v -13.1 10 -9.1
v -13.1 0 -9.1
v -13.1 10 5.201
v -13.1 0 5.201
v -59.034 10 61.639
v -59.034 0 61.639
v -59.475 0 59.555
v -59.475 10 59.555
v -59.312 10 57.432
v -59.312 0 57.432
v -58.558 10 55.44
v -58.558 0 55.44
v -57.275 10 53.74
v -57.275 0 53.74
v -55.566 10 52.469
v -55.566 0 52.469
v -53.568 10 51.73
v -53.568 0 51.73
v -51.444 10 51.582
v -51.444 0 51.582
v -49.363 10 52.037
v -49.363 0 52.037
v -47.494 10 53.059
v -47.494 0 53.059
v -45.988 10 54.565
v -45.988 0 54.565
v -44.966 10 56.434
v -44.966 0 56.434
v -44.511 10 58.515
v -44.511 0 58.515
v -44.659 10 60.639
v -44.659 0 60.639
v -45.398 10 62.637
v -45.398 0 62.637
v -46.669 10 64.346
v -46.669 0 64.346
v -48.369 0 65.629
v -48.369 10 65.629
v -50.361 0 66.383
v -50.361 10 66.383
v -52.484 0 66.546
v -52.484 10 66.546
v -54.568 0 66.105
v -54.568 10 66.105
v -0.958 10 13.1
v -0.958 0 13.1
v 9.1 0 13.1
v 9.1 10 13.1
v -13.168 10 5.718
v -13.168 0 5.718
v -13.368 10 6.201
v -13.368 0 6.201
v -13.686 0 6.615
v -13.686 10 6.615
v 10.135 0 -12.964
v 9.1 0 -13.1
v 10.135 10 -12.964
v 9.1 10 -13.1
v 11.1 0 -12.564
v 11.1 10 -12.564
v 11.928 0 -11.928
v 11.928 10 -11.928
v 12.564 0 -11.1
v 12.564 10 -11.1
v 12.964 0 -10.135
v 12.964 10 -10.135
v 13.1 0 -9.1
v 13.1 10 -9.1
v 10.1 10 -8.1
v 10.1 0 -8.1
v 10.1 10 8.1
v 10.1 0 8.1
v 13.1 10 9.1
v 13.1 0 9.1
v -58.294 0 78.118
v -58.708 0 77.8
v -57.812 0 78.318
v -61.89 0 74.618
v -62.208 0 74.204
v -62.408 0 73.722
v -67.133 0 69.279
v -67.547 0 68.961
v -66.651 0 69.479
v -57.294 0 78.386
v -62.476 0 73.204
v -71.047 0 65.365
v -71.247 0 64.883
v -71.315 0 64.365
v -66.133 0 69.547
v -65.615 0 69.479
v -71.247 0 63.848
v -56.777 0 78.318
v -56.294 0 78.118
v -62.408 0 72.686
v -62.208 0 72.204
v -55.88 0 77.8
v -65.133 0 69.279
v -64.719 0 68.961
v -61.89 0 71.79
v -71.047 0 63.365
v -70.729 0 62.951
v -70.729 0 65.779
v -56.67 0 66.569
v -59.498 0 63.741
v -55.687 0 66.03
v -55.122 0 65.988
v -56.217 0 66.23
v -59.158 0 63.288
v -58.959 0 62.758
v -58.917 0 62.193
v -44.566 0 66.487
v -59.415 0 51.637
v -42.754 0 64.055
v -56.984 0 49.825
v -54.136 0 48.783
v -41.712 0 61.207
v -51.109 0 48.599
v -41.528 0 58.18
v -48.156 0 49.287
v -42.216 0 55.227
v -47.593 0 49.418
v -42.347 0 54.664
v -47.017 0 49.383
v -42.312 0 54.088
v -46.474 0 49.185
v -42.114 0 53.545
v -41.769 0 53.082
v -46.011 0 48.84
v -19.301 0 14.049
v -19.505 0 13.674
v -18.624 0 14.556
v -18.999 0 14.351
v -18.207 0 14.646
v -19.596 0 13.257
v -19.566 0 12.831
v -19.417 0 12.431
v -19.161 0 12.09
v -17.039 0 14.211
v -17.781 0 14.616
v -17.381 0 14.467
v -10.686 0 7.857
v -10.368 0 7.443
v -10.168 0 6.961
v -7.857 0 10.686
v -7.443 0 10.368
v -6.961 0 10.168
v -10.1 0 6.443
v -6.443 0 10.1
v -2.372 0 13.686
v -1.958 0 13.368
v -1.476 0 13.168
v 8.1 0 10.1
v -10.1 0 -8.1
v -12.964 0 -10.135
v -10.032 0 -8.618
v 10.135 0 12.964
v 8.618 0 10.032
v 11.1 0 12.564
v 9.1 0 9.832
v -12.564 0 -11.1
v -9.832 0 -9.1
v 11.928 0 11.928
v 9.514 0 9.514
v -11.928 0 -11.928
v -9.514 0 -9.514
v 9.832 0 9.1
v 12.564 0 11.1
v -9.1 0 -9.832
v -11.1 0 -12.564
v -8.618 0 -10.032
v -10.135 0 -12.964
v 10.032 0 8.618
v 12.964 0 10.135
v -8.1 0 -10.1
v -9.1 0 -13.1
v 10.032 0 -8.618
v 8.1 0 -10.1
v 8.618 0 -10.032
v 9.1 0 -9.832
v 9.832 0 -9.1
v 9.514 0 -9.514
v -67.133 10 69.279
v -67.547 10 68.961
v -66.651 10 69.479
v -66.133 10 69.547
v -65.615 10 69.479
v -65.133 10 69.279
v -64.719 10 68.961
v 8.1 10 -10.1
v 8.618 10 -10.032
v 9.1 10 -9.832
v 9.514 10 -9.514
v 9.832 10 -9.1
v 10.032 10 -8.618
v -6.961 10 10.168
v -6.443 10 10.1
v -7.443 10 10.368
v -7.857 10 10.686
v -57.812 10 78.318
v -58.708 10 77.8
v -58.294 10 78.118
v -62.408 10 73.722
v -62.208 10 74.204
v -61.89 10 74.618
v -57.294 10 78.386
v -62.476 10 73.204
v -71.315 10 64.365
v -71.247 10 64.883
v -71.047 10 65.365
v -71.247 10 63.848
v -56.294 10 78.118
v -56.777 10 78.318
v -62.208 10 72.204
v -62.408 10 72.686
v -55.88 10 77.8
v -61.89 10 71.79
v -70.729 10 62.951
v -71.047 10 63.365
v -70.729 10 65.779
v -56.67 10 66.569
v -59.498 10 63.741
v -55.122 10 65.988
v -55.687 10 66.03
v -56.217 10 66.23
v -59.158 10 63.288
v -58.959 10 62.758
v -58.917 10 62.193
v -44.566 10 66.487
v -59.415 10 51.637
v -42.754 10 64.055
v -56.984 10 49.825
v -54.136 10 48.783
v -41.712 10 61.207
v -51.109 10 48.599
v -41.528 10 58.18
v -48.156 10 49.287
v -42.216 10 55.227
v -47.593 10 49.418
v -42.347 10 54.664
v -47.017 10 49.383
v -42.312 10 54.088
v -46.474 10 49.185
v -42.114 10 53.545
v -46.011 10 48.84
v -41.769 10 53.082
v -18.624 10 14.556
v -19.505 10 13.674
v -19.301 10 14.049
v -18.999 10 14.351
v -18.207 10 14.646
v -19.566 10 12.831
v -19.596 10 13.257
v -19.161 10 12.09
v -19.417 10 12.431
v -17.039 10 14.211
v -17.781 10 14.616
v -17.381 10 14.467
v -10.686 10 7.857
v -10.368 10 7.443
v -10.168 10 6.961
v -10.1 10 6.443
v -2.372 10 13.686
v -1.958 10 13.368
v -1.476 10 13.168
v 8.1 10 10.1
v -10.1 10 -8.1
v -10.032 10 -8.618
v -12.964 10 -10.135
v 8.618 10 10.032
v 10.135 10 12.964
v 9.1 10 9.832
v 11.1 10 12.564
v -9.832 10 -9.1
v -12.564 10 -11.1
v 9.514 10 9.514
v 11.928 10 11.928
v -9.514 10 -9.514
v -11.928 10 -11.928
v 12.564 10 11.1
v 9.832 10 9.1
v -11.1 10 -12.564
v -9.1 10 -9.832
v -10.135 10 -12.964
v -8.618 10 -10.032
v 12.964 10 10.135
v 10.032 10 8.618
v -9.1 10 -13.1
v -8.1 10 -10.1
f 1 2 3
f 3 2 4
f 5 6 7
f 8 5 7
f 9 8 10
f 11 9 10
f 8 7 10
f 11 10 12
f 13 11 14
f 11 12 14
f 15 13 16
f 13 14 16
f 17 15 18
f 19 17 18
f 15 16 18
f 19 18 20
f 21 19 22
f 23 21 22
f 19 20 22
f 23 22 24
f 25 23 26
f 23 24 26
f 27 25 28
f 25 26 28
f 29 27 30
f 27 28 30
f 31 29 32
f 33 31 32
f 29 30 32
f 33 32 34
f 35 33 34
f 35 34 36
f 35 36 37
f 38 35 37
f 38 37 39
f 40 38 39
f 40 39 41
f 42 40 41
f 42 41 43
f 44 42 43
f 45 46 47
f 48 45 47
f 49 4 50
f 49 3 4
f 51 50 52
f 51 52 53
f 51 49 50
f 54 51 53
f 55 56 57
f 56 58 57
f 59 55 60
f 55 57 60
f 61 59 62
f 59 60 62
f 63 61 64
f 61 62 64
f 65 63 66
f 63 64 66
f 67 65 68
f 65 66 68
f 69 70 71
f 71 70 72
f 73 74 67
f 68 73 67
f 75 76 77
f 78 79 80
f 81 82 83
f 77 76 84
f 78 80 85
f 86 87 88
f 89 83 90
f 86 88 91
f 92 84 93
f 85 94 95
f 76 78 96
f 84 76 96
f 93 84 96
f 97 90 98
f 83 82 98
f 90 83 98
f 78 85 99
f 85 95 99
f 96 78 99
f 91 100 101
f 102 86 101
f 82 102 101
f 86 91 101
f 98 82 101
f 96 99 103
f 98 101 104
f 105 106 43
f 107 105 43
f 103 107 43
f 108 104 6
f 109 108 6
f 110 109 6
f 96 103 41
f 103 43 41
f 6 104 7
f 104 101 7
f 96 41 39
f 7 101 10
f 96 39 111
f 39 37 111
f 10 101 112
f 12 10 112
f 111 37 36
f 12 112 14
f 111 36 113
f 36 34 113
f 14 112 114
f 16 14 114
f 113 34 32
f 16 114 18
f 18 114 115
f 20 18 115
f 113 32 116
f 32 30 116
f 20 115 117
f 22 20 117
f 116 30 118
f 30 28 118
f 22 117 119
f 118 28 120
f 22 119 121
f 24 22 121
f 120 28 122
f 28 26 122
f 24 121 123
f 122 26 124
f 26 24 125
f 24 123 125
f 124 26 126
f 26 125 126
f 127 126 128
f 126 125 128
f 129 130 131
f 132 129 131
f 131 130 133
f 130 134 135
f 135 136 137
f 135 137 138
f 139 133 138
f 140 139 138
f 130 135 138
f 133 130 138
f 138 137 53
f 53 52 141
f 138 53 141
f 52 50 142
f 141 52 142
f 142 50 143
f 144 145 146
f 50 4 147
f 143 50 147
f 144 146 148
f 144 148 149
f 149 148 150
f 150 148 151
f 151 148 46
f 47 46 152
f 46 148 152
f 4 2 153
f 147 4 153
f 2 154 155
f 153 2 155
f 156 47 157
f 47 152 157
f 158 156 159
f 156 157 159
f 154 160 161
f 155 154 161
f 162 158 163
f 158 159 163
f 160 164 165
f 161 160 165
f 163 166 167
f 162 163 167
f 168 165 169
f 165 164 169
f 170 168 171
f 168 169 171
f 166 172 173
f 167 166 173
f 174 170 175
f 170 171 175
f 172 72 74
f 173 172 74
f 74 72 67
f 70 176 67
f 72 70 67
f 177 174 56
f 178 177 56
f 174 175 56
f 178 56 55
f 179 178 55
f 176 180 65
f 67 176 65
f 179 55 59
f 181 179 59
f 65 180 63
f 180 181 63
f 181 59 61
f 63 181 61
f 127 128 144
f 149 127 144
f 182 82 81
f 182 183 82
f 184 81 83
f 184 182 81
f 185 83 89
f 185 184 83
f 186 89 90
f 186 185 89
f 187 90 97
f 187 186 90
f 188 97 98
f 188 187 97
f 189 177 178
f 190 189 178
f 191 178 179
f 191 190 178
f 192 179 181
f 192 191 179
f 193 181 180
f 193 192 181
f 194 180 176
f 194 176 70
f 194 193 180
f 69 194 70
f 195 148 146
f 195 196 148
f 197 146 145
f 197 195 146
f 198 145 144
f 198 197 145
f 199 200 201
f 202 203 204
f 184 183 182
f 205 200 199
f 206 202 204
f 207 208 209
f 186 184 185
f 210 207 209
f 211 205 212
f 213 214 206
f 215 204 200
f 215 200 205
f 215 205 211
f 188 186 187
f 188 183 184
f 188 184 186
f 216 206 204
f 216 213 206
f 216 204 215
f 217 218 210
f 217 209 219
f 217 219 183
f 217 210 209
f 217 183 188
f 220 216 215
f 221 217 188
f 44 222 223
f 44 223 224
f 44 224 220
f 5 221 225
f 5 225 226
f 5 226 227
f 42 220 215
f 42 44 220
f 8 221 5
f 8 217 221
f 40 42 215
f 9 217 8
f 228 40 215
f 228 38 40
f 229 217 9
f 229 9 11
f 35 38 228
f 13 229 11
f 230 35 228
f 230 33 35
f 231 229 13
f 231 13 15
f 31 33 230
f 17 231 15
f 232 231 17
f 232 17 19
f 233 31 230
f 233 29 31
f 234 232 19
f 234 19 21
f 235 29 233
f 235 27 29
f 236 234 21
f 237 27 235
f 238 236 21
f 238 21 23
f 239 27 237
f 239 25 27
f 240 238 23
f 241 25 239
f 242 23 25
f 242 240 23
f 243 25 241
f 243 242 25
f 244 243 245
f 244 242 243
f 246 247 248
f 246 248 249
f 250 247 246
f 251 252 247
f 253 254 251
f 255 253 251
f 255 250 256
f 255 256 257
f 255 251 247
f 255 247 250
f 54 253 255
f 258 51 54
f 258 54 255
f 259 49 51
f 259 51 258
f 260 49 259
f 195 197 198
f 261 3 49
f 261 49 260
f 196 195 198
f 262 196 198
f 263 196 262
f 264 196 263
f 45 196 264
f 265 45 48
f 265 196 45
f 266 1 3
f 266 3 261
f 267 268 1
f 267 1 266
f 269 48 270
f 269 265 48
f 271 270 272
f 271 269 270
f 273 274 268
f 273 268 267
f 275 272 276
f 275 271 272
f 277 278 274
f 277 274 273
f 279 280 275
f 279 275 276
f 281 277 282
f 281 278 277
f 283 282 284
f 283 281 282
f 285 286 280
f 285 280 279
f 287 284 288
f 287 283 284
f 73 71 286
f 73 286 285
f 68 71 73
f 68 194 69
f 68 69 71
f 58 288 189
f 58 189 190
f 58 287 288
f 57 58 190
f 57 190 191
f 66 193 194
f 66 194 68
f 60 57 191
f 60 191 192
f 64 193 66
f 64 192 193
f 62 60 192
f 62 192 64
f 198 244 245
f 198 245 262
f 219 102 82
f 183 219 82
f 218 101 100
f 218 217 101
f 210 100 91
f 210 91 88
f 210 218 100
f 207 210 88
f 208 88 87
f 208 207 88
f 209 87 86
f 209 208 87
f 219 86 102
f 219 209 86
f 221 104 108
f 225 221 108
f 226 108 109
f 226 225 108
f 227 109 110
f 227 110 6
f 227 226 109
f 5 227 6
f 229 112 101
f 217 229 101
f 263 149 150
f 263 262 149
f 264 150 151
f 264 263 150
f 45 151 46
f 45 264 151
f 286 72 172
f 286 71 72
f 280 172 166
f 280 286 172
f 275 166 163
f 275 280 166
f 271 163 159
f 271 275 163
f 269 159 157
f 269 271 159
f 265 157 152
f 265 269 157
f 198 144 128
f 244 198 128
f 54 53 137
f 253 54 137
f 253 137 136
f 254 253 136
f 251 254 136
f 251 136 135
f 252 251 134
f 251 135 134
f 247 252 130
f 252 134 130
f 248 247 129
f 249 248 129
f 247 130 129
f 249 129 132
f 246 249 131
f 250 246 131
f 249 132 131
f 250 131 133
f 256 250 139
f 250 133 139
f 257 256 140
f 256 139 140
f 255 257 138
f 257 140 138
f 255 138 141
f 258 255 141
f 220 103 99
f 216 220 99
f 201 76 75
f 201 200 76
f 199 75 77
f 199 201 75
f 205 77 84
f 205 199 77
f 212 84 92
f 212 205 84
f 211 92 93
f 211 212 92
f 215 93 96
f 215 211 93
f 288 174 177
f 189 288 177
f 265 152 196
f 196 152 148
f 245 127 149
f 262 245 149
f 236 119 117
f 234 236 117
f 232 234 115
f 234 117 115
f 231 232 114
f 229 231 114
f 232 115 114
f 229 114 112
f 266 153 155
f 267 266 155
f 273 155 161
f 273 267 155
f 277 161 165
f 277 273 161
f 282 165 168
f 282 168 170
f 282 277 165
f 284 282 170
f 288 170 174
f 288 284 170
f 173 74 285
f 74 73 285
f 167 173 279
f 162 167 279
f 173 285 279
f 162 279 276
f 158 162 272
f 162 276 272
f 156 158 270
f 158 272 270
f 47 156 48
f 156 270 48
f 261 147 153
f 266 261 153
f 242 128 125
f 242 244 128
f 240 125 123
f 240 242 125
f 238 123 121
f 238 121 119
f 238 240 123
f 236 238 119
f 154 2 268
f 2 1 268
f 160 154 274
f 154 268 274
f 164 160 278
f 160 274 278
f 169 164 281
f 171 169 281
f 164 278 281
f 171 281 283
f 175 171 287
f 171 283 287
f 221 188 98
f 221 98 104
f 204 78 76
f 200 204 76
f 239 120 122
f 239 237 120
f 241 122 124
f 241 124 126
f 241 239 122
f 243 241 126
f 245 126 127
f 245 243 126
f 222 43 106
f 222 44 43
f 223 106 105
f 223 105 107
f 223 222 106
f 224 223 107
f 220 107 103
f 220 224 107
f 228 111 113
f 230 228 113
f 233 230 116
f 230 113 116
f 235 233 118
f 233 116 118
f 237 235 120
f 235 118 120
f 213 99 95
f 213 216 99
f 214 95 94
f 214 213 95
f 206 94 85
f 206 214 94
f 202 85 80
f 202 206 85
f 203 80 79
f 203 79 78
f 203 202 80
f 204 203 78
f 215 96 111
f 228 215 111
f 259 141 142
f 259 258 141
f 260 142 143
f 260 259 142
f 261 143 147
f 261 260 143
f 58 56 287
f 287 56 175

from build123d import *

# Parameters (mm, degrees)
EXTRUDE_1_DEPTH = 10
FILLET_1_R      = 2
FILLET_2_R      = 4


with BuildPart() as part:
    # Эскиз1 → Бобышка-Вытянуть1 (new body)
    with BuildSketch(Plane(origin=(0, 0, 0), x_dir=(1, 0, 0), z_dir=(0, 1, 0))):
        with BuildLine():
            Line((-13.1, 13.1), (-13.1, -6.028932188))
            Line((-13.1, -6.028932188), (-19.160660172, -12.08959236))
            ThreePointArc((-19.160660172, -12.08959236), (-19.160660172, -14.210912703), (-17.039339828, -14.210912703))
            Line((-17.039339828, -14.210912703), (-10.1, -7.271572875))
            Line((-10.1, -7.271572875), (-10.1, 10.1))
            Line((-10.1, 10.1), (10.1, 10.1))
            Line((10.1, 10.1), (10.1, -10.1))
            Line((10.1, -10.1), (-7.271572875, -10.1))
            Line((-7.271572875, -10.1), (-46.997068573, -49.825495698))
            ThreePointArc((-46.997068573, -49.825495698), (-53.506753578, -48.67194049), (-59.415494168, -51.637319575))
            Line((-59.415494168, -51.637319575), (-72.143416229, -64.365241636))
            Line((-72.143416229, -64.365241636), (-66.133008589, -70.375649276))
            Line((-66.133008589, -70.375649276), (-58.516348603, -62.75898929))
            ThreePointArc((-58.516348603, -62.75898929), (-46.687572106, -53.758639918), (-55.687921478, -65.587416415))
            Line((-55.687921478, -65.587416415), (-63.304581464, -73.204076401))
            Line((-63.304581464, -73.204076401), (-57.294173824, -79.214484041))
            Line((-57.294173824, -79.214484041), (-44.566251763, -66.48656198))
            ThreePointArc((-44.566251763, -66.48656198), (-41.600872678, -60.57782139), (-42.754427886, -54.068136385))
            Line((-42.754427886, -54.068136385), (-1.786291501, -13.1))
            Line((-1.786291501, -13.1), (13.1, -13.1))
            Line((13.1, -13.1), (13.1, 13.1))
            Line((13.1, 13.1), (-13.1, 13.1))
        make_face()
    extrude(amount=EXTRUDE_1_DEPTH)

    # Скругление1
    fillet_1_edges = [part.edges().sort_by_distance(p)[0] for p in [
        (10.1, 5, 10.1),
        (10.1, 5, -10.1),
        (-10.1, 5, -10.1),
        (-10.1, 5, 7.271572875),
        (-13.1, 5, 6.028932188),
        (-1.786291501, 5, 13.1),
        (-42.754427886, 5, 54.068136385),
        (-57.294173824, 5, 79.214484041),
        (-63.304581464, 5, 73.204076401),
        (-55.687921478, 5, 65.587416415),
        (-58.516348603, 5, 62.75898929),
        (-66.133008589, 5, 70.375649276),
        (-72.143416229, 5, 64.365241636),
        (-46.997068573, 5, 49.825495698),
        (-7.271572875, 5, 10.1),
    ]]
    fillet(fillet_1_edges, radius=FILLET_1_R)

    # Скругление2
    fillet_2_edges = [part.edges().sort_by_distance(p)[0] for p in [
        (-13.1, 5, -13.1),
        (13.1, 5, -13.1),
        (13.1, 5, 13.1),
    ]]
    fillet(fillet_2_edges, radius=FILLET_2_R)


solid = part.part
